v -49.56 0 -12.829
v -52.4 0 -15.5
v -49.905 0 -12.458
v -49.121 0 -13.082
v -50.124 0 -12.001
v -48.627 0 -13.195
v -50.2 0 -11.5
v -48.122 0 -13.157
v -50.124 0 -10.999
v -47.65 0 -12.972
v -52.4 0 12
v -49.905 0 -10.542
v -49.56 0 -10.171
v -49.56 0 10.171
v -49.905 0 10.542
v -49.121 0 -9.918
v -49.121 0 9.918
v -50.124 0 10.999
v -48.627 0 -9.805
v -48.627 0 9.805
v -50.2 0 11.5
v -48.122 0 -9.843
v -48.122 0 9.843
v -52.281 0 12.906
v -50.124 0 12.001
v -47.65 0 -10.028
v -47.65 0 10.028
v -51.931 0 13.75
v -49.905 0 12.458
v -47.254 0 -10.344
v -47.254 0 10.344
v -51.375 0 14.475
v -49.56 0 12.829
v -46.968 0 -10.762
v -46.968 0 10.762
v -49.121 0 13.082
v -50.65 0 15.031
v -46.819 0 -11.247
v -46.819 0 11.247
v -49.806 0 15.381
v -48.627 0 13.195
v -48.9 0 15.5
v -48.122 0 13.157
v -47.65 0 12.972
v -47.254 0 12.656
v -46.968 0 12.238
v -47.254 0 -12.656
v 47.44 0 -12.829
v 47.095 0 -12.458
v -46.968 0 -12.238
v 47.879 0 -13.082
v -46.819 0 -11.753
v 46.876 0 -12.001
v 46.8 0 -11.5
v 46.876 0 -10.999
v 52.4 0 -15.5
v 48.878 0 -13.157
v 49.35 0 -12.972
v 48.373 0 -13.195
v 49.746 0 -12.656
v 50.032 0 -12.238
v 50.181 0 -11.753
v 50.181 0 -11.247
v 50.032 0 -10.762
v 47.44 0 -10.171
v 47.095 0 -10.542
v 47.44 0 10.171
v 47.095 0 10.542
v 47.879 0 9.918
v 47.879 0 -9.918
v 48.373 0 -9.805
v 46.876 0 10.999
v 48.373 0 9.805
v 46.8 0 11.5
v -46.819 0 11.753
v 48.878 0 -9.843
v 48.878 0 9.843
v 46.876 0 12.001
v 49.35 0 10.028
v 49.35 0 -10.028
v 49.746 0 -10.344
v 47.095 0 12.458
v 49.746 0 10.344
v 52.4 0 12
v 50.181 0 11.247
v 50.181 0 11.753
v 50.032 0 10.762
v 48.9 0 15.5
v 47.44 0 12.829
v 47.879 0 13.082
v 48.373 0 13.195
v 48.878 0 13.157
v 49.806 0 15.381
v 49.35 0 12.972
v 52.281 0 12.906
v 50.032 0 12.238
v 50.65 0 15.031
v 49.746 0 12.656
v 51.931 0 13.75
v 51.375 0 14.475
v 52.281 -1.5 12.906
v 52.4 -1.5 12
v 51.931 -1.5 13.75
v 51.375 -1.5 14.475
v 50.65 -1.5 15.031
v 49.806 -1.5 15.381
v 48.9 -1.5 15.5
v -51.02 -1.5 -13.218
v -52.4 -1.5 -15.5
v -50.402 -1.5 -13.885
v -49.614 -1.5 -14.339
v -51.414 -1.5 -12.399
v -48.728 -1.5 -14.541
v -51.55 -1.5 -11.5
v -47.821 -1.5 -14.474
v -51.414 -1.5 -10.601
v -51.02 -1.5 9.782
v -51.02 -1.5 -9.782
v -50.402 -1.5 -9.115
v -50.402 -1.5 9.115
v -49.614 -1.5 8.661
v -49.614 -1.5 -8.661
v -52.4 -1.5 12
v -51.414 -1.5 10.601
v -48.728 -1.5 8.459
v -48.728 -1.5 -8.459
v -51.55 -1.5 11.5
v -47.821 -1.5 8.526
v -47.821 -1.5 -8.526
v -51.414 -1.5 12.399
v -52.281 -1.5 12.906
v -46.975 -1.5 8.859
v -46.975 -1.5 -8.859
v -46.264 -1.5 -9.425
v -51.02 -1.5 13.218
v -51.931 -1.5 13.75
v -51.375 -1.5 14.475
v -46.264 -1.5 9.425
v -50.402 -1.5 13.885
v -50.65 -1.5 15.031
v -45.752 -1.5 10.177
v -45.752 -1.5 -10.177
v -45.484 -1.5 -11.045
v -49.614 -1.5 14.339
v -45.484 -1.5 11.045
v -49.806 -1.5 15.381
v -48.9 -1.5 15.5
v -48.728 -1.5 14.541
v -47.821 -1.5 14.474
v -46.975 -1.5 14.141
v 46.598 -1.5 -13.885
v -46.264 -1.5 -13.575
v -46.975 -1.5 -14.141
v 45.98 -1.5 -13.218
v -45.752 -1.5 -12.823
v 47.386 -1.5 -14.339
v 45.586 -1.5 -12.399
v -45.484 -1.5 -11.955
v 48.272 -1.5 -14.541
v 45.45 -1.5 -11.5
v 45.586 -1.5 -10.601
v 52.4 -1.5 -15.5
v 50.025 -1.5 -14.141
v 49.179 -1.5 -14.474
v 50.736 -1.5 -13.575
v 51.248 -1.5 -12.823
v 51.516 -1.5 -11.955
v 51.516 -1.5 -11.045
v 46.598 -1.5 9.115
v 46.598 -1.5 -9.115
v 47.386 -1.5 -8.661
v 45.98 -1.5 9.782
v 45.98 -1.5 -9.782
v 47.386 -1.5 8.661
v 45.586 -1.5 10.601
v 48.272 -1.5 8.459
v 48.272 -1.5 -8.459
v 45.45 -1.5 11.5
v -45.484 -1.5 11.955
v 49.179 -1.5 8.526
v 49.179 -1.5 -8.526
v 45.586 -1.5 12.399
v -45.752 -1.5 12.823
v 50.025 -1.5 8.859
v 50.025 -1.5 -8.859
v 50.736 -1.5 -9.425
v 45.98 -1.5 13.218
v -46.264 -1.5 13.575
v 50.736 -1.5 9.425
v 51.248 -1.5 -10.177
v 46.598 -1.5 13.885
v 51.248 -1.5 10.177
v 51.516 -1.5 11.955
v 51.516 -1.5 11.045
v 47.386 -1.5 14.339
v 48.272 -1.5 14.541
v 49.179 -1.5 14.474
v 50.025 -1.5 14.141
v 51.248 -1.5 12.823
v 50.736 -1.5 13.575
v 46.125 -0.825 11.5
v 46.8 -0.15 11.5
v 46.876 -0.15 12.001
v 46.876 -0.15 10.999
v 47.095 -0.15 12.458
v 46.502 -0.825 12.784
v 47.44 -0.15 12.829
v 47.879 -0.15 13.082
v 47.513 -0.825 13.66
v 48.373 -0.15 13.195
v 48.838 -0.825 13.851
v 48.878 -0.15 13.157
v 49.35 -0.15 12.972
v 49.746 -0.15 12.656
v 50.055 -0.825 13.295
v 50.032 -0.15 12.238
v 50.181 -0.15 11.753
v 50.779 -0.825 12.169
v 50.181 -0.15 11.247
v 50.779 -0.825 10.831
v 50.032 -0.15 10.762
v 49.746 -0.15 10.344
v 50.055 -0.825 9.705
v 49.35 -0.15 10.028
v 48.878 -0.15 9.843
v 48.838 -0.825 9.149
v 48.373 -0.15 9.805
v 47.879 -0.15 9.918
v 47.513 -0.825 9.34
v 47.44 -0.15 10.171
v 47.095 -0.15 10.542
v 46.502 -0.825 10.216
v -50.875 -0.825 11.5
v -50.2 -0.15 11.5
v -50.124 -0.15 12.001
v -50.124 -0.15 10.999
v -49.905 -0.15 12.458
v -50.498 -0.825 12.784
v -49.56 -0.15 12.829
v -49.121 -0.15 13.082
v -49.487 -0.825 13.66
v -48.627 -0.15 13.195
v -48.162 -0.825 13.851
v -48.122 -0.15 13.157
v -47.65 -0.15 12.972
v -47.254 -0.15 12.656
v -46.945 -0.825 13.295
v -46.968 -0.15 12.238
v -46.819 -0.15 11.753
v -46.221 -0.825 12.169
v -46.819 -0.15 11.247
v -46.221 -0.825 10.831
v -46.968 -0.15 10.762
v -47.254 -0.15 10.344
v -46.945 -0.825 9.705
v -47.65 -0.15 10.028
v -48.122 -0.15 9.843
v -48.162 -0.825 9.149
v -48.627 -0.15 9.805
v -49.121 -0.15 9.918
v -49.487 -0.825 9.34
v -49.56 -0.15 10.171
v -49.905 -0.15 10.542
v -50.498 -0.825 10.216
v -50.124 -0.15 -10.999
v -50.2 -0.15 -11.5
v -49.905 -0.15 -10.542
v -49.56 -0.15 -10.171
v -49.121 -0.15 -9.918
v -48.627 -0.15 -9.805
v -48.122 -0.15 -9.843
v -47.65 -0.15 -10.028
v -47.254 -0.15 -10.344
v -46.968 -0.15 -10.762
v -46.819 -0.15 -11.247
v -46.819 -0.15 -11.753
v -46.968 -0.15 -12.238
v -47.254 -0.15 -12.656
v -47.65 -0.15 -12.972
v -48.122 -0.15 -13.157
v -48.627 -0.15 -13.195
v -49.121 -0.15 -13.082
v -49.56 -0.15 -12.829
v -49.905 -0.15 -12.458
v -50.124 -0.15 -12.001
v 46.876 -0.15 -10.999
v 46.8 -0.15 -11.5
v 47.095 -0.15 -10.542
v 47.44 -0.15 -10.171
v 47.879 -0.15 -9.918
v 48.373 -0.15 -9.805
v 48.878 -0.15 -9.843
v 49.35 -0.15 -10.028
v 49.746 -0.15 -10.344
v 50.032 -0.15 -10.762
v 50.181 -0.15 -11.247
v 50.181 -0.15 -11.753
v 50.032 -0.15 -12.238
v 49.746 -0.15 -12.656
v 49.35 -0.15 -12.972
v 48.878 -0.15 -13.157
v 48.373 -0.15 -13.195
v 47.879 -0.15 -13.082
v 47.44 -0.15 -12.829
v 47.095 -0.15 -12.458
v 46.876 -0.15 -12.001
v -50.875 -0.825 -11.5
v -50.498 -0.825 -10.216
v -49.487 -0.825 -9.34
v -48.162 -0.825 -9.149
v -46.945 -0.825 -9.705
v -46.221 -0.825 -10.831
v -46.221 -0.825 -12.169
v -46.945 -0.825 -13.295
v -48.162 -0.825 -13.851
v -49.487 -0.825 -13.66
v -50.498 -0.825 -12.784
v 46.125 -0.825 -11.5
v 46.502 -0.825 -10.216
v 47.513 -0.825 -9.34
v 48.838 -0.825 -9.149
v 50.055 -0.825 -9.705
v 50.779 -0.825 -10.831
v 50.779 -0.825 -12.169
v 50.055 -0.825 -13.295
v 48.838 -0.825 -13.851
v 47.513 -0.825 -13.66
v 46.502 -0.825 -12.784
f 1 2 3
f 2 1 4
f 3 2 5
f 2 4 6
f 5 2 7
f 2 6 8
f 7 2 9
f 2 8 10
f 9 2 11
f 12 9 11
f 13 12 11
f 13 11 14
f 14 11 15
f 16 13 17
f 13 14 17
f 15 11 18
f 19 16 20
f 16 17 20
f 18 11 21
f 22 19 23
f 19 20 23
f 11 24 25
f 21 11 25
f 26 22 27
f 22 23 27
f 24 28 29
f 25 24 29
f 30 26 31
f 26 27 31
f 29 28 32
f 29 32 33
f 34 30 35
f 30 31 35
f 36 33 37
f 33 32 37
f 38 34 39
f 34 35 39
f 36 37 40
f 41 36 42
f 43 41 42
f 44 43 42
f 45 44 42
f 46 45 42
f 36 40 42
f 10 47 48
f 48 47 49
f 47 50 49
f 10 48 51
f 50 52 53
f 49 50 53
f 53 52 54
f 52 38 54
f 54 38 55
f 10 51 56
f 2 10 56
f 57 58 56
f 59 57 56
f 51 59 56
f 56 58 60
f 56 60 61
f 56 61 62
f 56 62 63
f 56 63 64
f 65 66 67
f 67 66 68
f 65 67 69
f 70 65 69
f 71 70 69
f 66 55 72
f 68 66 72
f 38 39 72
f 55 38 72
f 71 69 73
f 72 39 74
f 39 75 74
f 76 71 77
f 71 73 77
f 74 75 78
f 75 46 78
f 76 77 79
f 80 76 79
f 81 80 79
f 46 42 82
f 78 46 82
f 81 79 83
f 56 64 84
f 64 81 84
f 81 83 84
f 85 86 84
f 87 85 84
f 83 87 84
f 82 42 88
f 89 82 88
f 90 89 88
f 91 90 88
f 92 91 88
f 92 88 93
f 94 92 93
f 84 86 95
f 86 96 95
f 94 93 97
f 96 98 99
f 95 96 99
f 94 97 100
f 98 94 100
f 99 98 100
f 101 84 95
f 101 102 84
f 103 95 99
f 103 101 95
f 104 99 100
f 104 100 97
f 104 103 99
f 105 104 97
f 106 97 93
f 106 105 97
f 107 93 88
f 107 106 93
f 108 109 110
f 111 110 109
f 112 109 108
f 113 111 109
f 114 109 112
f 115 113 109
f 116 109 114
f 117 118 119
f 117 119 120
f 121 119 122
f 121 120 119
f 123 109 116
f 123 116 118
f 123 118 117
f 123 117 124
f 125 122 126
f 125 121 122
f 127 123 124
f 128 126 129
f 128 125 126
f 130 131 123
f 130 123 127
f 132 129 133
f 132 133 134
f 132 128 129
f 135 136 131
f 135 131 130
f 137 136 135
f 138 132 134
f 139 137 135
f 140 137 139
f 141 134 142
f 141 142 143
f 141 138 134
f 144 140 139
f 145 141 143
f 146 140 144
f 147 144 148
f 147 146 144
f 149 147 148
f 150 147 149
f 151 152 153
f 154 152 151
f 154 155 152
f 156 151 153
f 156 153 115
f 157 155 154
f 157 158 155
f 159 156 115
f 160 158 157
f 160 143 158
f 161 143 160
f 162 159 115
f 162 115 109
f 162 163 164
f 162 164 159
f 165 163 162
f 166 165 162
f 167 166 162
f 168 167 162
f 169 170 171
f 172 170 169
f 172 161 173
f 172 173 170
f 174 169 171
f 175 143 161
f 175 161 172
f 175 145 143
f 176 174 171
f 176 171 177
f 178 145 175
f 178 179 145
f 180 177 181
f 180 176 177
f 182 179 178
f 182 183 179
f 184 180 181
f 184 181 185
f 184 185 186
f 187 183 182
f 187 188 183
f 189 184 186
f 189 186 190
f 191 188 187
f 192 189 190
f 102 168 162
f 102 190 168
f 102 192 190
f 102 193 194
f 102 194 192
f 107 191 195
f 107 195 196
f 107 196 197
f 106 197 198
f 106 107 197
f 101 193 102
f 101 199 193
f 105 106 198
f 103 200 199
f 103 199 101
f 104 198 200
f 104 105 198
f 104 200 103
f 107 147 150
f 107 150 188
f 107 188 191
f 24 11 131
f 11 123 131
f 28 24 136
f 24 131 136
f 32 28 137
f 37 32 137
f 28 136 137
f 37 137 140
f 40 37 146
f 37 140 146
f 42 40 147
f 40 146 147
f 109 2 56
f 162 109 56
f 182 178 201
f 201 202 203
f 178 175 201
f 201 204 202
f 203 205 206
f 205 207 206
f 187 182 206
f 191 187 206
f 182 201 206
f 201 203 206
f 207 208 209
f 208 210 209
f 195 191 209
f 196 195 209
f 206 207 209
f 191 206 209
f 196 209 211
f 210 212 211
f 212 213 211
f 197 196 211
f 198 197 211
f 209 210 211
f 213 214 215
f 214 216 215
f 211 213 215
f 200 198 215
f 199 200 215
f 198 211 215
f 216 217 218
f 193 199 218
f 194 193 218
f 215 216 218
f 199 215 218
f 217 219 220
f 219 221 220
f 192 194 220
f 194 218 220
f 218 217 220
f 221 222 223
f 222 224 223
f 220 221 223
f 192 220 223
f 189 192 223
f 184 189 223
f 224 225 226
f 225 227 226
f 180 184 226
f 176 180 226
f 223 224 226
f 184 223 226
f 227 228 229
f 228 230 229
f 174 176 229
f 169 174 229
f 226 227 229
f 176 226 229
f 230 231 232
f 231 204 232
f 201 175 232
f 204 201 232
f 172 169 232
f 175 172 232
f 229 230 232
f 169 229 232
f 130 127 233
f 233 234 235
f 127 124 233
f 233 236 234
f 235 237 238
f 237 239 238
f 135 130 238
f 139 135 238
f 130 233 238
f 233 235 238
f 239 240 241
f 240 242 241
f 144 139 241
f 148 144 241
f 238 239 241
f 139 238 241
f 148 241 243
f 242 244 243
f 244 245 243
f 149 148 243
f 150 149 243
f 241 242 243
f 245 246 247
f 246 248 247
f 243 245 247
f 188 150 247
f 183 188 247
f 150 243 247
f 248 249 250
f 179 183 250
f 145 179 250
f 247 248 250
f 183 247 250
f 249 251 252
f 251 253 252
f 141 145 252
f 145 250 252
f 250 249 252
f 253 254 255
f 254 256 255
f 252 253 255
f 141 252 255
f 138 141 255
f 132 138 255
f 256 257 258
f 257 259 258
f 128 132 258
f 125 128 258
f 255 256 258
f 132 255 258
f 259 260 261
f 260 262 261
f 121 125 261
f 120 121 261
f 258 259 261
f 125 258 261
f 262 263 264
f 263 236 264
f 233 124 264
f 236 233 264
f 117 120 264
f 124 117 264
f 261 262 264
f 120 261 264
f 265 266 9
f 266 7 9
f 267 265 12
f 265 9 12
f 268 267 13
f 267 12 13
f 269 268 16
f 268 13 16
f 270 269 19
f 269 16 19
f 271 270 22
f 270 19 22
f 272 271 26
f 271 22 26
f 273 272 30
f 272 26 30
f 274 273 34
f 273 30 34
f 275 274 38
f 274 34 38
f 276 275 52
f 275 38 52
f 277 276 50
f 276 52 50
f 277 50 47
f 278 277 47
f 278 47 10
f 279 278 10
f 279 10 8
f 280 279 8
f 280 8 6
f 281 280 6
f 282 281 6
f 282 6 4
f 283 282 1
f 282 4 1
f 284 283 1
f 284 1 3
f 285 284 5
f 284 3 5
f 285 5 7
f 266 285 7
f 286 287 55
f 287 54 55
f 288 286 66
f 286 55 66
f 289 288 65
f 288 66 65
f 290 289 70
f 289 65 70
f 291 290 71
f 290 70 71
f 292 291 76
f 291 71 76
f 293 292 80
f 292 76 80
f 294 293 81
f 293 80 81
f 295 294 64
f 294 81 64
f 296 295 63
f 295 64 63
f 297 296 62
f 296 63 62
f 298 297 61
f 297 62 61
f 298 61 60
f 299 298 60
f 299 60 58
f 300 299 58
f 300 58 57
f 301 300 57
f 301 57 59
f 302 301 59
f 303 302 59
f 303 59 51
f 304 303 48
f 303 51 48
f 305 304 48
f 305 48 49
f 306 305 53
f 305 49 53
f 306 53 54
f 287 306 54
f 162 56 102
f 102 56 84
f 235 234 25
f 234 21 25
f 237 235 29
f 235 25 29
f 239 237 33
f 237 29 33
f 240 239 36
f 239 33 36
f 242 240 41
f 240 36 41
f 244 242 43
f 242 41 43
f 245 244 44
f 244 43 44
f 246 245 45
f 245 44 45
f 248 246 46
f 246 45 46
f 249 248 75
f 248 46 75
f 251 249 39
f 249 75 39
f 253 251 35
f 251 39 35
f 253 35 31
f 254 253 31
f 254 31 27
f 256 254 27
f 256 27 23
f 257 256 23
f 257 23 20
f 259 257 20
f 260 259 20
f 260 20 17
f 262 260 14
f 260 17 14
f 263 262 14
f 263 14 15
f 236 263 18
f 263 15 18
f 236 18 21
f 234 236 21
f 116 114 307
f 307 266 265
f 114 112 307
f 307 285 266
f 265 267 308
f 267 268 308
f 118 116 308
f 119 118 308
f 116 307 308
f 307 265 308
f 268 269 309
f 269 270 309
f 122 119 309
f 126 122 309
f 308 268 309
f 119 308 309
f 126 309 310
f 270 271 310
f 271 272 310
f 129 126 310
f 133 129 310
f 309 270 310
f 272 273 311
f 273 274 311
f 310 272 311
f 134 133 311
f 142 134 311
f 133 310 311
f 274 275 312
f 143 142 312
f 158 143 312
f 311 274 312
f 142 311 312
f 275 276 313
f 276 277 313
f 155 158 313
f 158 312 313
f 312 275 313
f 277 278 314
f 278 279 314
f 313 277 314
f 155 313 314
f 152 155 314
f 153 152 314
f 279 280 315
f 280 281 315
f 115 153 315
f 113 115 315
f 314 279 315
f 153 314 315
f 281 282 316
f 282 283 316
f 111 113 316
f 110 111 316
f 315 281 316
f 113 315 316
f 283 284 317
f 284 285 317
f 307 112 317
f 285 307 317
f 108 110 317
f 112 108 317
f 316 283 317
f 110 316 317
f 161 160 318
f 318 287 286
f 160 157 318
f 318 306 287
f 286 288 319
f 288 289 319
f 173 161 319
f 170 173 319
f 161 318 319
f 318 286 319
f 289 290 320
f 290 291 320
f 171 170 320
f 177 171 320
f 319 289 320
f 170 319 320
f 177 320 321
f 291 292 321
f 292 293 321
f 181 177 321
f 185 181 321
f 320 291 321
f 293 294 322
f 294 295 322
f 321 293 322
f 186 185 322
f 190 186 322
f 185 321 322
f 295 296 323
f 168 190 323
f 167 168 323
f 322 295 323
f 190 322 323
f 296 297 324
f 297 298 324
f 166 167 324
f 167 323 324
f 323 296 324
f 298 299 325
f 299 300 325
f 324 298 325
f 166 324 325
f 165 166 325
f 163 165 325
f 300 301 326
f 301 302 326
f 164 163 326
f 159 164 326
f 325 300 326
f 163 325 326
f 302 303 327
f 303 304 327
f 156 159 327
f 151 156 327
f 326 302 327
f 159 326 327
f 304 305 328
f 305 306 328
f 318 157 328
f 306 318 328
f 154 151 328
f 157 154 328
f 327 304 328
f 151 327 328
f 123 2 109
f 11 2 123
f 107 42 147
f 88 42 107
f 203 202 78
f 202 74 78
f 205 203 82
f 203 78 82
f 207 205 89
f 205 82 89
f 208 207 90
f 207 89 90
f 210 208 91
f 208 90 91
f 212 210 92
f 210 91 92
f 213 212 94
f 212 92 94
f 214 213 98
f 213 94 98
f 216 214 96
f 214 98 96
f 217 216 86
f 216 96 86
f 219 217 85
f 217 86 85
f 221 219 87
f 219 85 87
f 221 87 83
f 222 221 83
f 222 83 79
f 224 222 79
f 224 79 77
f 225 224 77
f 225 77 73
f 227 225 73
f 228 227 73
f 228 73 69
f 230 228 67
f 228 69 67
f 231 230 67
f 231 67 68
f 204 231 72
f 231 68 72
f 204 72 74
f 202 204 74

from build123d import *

# Parameters (mm, degrees)
SKETCH_W         = 104.8
SKETCH_H         = 31
PAD_DEPTH        = 1.5
HOLE_D           = 3.4
HOLE_DEPTH       = 25
HOLE_CSINK_D     = 6.1
HOLE_CSINK_ANGLE = 90
FILLET_R         = 3.5


with BuildPart() as part:
    # Sketch → Pad (new body)
    with BuildSketch(Plane.XZ):
        Rectangle(SKETCH_W, SKETCH_H)
    extrude(amount=PAD_DEPTH)

    # Hole
    with Locations(Plane.XZ.offset(1.5)):
        with Locations((-48.5, 11.5), (-48.5, -11.5), (48.5, -11.5), (48.5, 11.5)):
            CounterSinkHole(HOLE_D / 2, HOLE_CSINK_D / 2, depth=HOLE_DEPTH, counter_sink_angle=HOLE_CSINK_ANGLE)

    # Fillet
    fillet_edges = [part.edges().sort_by_distance(p)[0] for p in [
        (-52.4, -0.75, 15.5),
        (52.4, -0.75, 15.5),
    ]]
    fillet(fillet_edges, radius=FILLET_R)


solid = part.part
